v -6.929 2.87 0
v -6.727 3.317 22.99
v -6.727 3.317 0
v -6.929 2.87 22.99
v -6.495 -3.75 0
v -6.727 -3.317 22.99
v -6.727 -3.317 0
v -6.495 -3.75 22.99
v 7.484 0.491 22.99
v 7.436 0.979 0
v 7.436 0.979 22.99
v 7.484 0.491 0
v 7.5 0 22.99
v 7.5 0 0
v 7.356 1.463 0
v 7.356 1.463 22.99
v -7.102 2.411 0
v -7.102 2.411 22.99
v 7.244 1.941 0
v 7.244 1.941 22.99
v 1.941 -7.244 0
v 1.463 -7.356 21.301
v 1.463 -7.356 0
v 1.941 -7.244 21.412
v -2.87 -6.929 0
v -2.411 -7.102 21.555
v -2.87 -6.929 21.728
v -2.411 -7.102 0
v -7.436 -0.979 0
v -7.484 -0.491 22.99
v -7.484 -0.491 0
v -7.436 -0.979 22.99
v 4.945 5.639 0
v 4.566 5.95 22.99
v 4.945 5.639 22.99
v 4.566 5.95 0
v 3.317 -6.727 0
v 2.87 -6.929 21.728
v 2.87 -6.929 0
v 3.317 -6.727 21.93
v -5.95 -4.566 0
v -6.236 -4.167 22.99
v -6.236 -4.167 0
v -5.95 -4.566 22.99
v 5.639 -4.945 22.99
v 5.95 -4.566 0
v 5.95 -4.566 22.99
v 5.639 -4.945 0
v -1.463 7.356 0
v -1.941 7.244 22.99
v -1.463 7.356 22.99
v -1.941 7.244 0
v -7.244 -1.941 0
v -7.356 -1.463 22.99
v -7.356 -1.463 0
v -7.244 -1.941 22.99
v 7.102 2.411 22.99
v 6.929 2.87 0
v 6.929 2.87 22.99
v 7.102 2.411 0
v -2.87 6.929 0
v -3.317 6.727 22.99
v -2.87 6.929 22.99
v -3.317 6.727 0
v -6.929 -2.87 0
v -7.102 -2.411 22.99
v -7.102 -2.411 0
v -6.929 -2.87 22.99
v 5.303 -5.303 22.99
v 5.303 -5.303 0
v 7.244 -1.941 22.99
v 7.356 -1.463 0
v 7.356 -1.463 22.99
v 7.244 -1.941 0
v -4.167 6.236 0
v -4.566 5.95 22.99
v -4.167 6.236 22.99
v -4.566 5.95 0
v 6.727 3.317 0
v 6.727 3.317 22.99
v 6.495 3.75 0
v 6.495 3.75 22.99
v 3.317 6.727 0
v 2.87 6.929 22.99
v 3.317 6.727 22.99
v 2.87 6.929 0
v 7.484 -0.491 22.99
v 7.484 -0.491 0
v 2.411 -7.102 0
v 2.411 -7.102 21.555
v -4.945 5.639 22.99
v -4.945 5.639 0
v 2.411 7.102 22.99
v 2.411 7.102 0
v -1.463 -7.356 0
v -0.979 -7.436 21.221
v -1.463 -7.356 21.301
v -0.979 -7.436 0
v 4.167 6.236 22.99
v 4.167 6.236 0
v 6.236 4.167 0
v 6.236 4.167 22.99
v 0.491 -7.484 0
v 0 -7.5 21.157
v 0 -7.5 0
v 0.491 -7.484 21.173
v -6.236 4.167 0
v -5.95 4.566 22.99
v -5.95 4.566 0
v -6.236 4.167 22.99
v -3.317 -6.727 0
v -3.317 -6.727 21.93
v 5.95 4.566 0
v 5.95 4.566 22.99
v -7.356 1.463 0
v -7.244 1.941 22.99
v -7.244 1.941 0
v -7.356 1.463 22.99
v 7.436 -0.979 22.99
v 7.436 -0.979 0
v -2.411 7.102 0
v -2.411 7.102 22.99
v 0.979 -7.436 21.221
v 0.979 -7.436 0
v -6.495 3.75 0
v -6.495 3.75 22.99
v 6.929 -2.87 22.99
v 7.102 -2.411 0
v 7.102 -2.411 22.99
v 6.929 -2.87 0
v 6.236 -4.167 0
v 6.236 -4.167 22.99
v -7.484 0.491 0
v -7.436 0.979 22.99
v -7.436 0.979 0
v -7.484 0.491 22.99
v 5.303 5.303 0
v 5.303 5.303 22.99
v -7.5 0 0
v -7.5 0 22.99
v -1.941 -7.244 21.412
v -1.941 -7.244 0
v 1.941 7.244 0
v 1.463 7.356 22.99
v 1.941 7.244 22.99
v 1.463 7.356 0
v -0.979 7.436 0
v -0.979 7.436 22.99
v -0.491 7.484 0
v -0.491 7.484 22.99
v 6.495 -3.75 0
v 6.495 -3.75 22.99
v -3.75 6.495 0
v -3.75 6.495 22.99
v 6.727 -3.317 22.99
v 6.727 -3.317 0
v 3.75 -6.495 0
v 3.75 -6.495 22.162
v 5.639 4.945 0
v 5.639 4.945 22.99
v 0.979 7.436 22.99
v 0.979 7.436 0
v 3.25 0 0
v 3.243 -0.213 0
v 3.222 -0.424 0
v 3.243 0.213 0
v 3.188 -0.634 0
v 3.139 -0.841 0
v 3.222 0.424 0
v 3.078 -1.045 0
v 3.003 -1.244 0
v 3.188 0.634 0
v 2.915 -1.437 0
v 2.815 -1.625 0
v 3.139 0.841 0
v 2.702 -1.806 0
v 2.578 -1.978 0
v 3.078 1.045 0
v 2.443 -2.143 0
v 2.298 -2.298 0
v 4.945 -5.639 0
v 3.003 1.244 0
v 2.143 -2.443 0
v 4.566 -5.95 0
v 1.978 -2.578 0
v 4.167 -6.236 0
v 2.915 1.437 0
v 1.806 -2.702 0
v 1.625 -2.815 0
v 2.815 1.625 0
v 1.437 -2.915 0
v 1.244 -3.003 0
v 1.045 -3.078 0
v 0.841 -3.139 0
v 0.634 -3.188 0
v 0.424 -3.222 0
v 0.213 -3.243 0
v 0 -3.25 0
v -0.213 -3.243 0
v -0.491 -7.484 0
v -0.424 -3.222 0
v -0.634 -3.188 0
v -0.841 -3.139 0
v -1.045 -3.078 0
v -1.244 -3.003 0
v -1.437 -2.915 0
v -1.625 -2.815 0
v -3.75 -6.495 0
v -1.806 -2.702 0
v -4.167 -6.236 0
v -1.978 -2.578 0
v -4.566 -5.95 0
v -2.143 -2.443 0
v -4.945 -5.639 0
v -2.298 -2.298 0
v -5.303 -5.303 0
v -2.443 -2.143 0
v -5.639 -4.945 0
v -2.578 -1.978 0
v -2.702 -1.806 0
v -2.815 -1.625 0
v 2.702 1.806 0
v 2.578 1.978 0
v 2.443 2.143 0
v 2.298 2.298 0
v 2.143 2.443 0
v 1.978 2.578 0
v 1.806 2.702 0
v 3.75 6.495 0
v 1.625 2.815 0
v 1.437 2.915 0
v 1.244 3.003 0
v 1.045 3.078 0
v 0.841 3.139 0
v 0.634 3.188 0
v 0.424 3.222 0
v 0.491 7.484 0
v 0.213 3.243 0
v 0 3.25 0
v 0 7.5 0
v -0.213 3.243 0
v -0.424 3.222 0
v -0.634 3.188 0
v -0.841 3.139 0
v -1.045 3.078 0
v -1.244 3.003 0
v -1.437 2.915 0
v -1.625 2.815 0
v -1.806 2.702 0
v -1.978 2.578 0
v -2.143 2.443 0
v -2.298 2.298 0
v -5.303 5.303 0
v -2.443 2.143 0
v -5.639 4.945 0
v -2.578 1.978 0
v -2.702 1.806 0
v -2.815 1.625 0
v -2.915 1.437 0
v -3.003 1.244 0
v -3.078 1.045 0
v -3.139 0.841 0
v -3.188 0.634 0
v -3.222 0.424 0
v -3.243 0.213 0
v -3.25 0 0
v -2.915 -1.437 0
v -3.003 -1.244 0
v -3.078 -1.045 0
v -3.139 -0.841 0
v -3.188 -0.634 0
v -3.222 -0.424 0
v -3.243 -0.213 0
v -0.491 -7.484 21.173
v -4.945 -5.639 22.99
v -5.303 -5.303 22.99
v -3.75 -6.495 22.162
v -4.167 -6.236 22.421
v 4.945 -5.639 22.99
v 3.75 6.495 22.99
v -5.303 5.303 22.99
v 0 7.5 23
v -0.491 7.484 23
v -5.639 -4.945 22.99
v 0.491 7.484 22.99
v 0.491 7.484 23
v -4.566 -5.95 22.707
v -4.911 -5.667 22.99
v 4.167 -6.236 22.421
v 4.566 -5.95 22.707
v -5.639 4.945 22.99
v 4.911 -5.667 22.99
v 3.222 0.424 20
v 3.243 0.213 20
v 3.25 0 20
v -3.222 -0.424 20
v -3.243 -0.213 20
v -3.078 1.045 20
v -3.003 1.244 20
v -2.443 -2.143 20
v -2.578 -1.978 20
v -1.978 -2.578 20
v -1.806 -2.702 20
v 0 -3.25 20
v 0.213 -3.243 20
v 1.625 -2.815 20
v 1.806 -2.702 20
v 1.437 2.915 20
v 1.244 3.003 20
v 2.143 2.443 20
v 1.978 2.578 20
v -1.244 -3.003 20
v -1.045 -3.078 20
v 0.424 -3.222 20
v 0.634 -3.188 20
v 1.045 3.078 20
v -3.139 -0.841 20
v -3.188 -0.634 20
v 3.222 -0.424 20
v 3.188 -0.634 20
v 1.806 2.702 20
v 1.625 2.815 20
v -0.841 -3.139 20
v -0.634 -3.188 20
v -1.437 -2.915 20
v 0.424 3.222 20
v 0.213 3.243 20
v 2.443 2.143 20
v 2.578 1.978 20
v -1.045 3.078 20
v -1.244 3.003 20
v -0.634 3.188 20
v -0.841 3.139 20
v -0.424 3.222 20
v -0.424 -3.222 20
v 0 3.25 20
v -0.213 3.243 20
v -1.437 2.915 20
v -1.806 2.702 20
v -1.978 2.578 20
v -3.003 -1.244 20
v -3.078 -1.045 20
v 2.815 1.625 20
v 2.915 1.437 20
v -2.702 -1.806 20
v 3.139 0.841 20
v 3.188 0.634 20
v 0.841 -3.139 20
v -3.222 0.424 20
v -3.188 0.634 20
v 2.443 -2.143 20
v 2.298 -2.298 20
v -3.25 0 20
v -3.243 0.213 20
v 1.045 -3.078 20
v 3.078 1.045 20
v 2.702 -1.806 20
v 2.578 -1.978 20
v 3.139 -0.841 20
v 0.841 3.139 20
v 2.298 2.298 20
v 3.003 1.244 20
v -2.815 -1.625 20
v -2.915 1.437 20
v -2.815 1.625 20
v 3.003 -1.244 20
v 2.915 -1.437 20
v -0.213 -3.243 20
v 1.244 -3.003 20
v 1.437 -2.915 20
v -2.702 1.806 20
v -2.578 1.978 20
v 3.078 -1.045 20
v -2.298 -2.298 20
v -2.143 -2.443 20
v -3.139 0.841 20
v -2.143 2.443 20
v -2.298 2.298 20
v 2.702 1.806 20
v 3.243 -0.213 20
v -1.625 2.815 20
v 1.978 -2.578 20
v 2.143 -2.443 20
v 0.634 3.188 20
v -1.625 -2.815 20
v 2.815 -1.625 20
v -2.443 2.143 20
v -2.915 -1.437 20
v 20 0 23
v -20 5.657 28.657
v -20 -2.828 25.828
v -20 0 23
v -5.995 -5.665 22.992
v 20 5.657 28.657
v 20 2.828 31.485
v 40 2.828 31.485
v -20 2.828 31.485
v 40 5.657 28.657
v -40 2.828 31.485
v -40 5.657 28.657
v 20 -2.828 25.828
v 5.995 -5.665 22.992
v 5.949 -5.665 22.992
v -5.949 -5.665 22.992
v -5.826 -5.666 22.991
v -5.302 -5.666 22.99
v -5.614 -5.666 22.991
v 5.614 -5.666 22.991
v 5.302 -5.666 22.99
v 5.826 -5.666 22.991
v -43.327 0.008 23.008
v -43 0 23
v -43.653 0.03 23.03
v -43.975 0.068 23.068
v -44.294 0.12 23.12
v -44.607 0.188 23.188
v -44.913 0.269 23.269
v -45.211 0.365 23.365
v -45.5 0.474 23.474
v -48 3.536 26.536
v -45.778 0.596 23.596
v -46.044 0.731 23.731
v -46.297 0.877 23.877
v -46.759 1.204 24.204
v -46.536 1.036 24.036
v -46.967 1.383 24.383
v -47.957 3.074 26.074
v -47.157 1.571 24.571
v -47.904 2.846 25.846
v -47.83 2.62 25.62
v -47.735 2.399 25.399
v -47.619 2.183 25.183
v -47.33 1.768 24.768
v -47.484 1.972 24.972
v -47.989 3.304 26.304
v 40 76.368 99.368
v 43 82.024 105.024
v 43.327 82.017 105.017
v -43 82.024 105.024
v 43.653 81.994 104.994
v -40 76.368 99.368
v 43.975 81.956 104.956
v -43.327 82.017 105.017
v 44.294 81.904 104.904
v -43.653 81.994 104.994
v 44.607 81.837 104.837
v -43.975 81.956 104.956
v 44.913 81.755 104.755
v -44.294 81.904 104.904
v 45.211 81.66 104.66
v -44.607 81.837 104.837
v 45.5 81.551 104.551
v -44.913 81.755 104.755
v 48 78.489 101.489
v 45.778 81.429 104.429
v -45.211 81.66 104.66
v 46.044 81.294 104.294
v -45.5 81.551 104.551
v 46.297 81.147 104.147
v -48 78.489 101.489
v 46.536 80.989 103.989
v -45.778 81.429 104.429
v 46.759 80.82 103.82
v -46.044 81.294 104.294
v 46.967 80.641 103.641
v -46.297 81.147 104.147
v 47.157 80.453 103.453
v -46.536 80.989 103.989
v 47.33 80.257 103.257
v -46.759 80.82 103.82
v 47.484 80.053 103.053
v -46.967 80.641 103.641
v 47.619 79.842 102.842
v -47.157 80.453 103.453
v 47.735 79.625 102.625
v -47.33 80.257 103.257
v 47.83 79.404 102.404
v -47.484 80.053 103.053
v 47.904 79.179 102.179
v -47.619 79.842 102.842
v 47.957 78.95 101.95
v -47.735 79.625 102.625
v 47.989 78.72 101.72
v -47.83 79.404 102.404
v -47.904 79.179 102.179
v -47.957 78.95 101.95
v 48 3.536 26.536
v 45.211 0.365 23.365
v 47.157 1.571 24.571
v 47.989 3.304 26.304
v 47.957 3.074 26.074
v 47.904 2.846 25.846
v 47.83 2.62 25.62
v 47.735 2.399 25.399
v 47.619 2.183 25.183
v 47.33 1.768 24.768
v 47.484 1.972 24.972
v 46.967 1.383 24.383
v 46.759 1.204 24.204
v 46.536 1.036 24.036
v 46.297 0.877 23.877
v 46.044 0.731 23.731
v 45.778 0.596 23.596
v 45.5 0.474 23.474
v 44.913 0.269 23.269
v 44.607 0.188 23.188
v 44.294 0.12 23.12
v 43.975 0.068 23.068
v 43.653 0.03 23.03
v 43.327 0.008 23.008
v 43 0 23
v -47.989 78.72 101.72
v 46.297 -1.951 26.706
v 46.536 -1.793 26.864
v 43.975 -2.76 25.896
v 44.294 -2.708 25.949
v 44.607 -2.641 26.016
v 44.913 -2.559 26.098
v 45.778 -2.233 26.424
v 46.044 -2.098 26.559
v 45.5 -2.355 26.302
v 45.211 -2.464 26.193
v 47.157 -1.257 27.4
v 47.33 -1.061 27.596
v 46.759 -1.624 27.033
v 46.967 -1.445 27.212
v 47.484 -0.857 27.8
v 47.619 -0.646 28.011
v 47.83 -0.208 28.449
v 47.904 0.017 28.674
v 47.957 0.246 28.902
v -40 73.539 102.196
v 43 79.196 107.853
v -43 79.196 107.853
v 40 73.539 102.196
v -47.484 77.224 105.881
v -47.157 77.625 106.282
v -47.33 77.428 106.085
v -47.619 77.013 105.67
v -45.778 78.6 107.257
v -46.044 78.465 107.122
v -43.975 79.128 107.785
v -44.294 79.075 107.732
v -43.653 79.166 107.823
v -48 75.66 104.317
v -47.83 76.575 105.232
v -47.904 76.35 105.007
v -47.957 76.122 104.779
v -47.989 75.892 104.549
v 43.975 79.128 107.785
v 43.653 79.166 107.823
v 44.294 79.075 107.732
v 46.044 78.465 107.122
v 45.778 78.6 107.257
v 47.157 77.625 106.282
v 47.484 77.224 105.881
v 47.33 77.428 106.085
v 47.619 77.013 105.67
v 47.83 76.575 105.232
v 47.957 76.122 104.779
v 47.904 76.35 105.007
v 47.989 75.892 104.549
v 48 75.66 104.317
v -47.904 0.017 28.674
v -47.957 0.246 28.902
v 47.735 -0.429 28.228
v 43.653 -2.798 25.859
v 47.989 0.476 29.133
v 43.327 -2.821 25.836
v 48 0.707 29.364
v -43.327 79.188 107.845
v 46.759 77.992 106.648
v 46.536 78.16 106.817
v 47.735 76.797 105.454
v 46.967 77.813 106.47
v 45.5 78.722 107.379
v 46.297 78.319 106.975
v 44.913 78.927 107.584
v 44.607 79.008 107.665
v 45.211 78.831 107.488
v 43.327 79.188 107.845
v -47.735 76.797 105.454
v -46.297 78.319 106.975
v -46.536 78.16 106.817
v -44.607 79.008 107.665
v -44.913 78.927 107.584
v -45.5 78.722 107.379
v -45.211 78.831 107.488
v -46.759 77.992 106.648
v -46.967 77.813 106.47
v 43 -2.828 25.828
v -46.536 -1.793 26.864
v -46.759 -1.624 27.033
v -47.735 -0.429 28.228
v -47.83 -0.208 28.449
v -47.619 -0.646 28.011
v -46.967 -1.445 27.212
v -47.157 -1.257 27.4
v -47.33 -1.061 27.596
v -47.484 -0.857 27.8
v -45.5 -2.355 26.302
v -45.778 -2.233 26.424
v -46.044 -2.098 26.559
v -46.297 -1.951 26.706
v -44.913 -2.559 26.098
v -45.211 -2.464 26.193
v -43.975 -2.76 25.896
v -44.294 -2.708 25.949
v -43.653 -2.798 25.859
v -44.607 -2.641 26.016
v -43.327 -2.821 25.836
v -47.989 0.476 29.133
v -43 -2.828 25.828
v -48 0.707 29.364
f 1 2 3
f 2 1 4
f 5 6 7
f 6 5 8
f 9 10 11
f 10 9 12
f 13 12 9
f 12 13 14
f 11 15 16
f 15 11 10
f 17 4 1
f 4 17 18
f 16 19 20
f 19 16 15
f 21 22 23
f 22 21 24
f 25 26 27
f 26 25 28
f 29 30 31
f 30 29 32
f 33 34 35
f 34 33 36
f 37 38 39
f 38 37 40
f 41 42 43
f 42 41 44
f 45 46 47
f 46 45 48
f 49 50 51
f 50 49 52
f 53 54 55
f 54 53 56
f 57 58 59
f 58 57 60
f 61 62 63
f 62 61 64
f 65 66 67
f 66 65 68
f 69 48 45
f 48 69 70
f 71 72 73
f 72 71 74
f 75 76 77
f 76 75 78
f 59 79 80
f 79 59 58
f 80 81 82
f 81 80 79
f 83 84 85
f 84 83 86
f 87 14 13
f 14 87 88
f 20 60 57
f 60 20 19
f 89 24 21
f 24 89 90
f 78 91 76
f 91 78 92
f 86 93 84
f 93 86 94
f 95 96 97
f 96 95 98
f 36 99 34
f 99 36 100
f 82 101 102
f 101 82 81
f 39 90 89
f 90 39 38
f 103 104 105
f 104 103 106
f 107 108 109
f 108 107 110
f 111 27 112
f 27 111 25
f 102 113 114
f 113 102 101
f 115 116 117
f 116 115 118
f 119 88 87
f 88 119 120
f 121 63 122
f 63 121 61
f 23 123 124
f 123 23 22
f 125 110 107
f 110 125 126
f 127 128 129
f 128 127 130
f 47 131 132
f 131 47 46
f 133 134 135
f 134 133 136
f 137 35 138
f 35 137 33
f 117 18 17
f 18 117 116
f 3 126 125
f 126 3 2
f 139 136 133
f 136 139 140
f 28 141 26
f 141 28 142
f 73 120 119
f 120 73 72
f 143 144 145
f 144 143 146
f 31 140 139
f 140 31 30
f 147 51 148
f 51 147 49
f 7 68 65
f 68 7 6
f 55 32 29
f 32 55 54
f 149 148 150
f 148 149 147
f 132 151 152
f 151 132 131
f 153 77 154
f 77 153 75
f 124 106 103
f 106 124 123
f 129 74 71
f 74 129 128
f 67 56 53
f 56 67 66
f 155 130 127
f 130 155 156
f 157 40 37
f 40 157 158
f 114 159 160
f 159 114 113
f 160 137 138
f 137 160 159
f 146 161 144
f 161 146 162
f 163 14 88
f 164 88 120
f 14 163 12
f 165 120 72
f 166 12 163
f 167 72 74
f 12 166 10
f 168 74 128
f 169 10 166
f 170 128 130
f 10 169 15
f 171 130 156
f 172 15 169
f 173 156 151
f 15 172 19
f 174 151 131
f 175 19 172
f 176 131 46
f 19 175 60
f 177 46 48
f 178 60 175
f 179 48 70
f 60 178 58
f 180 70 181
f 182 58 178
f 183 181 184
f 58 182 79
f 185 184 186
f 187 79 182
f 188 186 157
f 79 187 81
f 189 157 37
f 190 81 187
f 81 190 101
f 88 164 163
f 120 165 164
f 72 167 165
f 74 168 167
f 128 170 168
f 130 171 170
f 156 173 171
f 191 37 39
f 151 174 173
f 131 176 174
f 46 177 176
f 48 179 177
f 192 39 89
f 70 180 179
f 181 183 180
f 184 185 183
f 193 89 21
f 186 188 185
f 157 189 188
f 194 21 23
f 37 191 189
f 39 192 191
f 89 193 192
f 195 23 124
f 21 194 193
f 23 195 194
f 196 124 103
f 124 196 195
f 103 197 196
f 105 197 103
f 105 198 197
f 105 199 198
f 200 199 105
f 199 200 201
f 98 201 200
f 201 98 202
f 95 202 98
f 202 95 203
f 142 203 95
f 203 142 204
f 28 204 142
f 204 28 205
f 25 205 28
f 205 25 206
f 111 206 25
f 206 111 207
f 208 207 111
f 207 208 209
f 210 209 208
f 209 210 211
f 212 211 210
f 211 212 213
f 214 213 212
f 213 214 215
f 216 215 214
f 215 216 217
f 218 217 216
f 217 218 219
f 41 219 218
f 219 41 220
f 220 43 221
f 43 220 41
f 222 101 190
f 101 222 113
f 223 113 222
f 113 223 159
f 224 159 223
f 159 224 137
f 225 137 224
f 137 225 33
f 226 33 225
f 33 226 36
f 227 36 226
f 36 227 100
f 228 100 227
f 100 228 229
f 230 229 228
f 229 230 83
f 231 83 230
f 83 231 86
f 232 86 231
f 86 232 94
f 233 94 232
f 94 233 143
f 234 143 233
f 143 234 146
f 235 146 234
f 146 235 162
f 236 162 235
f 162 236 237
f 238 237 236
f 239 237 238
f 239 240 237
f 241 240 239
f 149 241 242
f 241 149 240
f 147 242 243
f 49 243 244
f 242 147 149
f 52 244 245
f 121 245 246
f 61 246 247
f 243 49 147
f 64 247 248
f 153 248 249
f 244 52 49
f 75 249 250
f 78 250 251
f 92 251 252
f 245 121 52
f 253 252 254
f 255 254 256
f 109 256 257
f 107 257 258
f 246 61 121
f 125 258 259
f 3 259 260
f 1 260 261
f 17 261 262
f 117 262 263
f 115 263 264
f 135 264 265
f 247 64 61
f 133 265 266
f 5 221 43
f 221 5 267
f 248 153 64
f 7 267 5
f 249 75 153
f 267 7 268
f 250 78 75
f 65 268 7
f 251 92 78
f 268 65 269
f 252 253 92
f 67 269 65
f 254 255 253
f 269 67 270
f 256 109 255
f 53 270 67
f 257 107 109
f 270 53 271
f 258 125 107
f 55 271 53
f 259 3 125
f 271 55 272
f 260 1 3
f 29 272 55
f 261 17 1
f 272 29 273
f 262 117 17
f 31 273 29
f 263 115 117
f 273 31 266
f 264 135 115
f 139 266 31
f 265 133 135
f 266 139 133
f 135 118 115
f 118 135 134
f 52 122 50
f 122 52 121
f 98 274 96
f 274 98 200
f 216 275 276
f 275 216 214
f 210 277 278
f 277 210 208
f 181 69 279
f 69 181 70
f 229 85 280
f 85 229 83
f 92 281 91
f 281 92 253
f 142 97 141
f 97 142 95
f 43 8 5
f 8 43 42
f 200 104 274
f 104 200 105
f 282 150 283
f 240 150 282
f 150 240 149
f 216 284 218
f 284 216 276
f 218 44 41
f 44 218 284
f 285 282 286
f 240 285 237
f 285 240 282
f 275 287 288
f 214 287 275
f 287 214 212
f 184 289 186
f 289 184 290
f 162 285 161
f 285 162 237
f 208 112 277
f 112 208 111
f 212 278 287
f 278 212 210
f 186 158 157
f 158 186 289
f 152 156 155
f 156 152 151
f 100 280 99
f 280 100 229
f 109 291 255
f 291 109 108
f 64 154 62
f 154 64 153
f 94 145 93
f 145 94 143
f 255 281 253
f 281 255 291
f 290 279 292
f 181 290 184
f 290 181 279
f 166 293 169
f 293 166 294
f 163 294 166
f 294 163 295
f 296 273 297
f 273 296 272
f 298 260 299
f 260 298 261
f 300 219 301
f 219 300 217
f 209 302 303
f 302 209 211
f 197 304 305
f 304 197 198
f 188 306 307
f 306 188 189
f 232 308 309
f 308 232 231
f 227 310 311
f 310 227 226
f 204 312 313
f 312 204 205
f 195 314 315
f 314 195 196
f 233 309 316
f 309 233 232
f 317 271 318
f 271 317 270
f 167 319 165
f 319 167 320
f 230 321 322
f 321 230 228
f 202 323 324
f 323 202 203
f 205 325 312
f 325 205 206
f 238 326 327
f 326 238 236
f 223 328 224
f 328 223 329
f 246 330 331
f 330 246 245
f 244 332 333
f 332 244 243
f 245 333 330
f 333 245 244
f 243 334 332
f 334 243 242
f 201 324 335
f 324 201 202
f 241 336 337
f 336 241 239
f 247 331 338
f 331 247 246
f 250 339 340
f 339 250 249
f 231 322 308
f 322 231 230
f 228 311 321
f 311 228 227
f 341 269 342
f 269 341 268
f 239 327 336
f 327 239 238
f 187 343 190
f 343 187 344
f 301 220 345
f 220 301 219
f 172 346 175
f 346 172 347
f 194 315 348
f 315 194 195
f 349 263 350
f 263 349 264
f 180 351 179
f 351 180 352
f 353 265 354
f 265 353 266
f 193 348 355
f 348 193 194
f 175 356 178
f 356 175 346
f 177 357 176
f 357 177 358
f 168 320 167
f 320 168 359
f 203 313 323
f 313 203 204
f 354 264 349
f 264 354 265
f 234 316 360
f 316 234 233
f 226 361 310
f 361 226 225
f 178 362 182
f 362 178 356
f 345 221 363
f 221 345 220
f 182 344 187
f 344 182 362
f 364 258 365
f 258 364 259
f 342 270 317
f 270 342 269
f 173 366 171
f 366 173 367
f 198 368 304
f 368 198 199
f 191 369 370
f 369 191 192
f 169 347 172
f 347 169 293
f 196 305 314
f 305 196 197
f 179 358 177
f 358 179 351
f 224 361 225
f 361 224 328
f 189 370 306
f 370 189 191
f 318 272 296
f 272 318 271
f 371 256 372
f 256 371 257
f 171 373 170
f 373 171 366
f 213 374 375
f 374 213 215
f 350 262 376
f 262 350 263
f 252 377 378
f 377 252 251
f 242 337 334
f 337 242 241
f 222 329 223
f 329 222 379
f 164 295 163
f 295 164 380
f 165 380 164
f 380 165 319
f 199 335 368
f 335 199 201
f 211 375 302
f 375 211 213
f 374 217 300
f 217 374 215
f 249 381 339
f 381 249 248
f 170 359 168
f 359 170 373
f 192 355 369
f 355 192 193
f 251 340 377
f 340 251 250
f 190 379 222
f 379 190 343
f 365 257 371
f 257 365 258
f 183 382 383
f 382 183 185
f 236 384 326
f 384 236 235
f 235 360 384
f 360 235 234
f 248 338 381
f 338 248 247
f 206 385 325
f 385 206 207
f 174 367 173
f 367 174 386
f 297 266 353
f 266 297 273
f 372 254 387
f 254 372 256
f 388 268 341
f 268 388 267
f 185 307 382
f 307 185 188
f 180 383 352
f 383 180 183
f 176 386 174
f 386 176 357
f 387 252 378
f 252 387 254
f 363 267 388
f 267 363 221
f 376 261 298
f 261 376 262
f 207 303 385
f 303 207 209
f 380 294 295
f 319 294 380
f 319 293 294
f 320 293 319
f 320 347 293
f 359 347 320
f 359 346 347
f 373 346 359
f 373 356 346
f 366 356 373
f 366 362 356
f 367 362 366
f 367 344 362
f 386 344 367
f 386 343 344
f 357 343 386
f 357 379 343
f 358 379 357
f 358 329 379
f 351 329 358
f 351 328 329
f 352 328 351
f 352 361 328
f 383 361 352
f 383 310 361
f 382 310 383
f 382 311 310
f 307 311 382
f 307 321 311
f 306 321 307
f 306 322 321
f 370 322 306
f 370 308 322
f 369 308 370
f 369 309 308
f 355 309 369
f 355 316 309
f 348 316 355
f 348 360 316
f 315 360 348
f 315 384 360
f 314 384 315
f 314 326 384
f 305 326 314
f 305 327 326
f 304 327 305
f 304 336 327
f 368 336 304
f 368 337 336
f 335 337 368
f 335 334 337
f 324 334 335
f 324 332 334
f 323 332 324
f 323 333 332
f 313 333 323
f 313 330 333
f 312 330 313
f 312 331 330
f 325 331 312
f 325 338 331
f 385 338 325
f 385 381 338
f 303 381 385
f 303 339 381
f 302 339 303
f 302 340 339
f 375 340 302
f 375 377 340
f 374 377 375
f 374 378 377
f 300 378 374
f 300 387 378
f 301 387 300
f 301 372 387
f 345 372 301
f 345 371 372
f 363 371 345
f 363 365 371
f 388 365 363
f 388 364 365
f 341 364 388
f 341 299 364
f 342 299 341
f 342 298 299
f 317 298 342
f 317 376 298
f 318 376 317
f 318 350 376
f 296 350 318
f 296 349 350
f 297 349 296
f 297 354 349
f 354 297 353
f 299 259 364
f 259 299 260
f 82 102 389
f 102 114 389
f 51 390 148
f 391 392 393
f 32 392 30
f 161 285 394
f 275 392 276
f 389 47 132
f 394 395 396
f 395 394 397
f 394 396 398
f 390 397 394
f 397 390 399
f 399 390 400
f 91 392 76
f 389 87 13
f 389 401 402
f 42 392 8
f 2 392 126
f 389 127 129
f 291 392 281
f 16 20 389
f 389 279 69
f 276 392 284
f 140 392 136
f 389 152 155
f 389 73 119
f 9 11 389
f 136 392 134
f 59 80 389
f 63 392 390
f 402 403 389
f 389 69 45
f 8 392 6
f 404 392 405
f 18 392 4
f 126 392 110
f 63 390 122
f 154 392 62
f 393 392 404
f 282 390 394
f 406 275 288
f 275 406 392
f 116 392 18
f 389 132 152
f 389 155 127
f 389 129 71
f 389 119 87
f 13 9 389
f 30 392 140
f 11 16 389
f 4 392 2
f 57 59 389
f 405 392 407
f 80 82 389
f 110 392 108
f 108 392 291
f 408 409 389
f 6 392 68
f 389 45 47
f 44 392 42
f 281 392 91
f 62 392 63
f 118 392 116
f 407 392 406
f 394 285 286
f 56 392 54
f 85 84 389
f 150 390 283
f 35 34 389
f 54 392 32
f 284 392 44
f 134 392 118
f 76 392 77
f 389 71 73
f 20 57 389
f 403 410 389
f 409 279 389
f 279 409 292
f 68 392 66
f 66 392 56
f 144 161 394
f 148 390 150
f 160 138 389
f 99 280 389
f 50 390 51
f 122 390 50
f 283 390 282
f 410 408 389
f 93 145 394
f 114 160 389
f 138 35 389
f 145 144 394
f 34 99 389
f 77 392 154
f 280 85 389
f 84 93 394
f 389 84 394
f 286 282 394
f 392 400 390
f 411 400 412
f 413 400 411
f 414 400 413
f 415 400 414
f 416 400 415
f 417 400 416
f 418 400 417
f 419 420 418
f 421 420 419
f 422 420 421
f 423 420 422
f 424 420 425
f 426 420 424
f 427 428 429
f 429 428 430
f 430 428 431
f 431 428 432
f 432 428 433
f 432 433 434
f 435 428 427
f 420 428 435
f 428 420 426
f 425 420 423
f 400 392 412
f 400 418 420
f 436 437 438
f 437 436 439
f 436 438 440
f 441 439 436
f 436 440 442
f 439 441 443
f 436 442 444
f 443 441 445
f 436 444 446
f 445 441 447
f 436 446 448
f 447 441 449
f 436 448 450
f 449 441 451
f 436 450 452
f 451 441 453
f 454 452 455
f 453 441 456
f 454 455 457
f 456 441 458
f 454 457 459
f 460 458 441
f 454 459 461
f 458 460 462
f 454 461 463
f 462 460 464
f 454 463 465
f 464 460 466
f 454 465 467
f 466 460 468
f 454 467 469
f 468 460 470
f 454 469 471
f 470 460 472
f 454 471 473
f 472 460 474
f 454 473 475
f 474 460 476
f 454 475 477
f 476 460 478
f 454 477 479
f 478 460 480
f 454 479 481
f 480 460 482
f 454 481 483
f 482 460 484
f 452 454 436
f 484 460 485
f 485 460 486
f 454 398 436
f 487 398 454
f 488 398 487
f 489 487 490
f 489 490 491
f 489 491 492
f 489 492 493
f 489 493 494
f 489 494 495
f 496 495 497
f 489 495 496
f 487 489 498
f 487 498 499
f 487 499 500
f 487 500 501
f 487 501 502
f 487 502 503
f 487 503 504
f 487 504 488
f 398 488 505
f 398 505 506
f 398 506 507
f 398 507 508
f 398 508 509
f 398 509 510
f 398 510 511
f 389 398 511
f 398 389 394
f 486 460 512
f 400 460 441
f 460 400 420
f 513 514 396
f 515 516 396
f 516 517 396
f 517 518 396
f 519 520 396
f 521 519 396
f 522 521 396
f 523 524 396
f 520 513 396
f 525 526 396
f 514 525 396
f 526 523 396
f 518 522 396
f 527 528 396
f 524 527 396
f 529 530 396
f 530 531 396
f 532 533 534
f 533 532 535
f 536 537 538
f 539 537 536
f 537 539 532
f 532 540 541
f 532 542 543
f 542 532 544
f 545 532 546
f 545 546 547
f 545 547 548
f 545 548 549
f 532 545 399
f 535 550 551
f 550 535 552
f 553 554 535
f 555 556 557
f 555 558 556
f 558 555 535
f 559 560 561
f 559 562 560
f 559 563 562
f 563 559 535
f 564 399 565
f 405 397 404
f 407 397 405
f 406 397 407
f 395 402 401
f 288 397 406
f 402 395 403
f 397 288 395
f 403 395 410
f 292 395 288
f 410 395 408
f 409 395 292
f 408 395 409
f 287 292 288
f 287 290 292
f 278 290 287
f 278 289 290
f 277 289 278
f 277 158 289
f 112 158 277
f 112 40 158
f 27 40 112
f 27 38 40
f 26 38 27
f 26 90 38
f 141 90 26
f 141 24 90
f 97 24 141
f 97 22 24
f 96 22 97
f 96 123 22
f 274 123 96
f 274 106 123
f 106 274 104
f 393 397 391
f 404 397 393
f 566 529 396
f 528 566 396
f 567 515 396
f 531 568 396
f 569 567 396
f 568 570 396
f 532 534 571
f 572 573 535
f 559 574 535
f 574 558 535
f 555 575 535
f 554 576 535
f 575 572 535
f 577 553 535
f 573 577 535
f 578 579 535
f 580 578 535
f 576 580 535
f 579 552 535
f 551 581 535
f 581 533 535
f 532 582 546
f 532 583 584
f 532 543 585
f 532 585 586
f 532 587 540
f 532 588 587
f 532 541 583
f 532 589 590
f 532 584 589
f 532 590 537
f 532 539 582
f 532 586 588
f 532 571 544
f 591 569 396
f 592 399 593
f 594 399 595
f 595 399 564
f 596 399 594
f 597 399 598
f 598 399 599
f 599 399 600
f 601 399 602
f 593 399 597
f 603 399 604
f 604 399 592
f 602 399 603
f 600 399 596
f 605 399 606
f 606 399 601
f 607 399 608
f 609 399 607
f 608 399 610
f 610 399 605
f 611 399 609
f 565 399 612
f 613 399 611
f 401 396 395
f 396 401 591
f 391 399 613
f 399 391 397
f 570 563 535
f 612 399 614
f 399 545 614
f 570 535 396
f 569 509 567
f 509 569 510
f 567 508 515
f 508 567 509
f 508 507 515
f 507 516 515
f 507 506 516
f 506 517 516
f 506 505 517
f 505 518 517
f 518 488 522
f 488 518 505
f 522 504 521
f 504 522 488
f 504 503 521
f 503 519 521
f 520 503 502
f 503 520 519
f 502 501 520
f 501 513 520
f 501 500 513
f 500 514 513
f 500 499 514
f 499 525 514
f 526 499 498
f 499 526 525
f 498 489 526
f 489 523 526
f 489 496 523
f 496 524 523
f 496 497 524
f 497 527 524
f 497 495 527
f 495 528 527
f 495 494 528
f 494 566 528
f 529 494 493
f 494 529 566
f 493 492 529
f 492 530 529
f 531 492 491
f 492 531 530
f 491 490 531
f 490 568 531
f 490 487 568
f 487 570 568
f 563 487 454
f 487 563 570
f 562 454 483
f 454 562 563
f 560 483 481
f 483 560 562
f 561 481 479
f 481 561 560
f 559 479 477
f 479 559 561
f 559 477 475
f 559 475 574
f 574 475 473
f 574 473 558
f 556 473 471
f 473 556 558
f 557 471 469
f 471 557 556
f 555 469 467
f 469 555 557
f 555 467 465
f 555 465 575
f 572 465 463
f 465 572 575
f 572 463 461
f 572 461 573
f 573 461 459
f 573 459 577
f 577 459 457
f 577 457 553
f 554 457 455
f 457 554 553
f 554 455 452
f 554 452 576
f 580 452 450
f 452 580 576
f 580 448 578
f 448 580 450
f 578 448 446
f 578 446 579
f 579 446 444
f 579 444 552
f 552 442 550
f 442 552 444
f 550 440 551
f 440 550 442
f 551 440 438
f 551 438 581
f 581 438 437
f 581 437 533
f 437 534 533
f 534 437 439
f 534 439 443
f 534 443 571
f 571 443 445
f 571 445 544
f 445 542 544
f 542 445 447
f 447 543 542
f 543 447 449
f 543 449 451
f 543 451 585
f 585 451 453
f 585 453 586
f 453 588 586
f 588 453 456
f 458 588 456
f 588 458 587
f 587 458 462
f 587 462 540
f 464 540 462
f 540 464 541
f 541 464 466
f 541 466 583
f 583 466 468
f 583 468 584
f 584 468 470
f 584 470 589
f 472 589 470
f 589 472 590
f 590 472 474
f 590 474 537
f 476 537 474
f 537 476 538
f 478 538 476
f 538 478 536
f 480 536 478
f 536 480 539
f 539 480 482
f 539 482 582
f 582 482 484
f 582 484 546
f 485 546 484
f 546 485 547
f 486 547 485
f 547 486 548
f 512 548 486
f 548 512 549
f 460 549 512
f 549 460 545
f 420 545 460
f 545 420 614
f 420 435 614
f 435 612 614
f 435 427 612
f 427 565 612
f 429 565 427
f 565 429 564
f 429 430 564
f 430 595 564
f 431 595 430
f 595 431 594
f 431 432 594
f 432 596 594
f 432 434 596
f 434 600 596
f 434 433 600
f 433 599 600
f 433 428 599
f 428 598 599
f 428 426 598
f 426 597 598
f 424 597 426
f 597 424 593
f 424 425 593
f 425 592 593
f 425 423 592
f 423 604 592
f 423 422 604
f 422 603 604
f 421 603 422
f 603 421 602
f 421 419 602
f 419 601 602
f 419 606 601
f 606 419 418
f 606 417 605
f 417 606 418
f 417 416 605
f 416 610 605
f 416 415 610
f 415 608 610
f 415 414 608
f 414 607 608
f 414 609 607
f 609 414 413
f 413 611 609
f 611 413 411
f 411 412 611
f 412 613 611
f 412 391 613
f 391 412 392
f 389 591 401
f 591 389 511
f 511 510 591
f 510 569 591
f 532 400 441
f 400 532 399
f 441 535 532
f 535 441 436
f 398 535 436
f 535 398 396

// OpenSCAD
// ===================================================================
// Angled Viewing Window
//
// A picture-frame border (outer rounded rectangle with a rectangular
// hole through the middle, like a real picture frame) mounted above a
// socket cylinder that is bored to take a 7 mm wooden dowel. The
// matching stand that holds the other end of the dowel is a separate
// part -- see dowel-stand.scad.
//
// The socket stays upright -- parallel to the Z axis, same as the
// dowel -- while only the frame tilts, hinged up and back off the
// socket's front rim by tilt_angle, so it leans over the socket
// without any part of it reaching down into the middle of the viewing
// opening. A tapered gusset (a smooth hull blend, like the root flare
// on a wine glass stem) fills the concave gap between the round
// socket and the flat underside of the frame, so the two parts are
// backed by a continuous wedge of solid material instead of meeting
// at a thin edge.
//
// Axes: X/Y = footprint on the table, Z = up.
// ===================================================================

/* [Dowel (mm)] */
dowel_diameter   = 6.5;     // actual diameter of the wooden dowel; must match dowel-stand.scad and mirror-spinner-stand.scad
hole_clearance   = 0;   // added to dowel_diameter for a snug press/slide fit; must match dowel-stand.scad and mirror-spinner-stand.scad
dowel_hole_depth = 20;    // how deep the dowel is expected to sit in the hole; must match dowel-stand.scad and mirror-spinner-stand.scad -- it's the one shared parameter that drives dowel-stand.scad's leg-equalizing math (socket_length below is defined from it), so change it there if you change it here

/* [Window picture-frame opening (mm)] */
opening_width  = 80;  // inner opening you look through, X (the "picture frame hole")
opening_depth  = 100;   // inner opening you look through, Y

/* [Window picture-frame border (mm)] */
frame_border    = 8;   // border width added on all sides (outer = opening + 2 * frame_border)
frame_thickness = 4;   // how thick the frame material is (depth into the page)
frame_corner_r  = 5;  // corner rounding radius of the OUTER edge of the frame

/* [Window socket cylinder] */
post_diameter   = 15;   // must match post_diameter in dowel-stand.scad
socket_diameter = post_diameter;  // cylinder attached to the bottom border, holds the dowel
socket_length   = dowel_hole_depth+3;  // length of the socket cylinder, continuing the frame's plane

/* [Window support gusset] */
gusset_width = 40;  // width of the reinforcing brace between socket and frame, along X (mm)
gusset_reach = 8;   // how far the brace extends into the frame border, from the pivot (mm)

/* [Window tilt] */
tilt_angle = 45;  // angle the whole frame+socket assembly leans forward, degrees

/* [Rendering] */
$fn = 96;

// ===== Derived values =====
dowel_hole_d = dowel_diameter + hole_clearance;
frame_width  = opening_width + 2 * frame_border;   // outer frame footprint, X
frame_depth  = opening_depth + 2 * frame_border;   // outer frame footprint, Y

// ===== Checks =====
assert(2 * frame_corner_r <= min(frame_width, frame_depth),
    "frame_corner_r is too large for the frame footprint");
assert(socket_diameter > dowel_hole_d,
    "socket_diameter must be larger than the dowel hole diameter");
assert(socket_length > dowel_hole_depth,
    "socket_length should be greater than dowel_hole_depth so the hole doesn't pass all the way through");
assert(gusset_width > 0 && gusset_width <= frame_width,
    "gusset_width must be positive and no wider than the frame");
assert(gusset_reach > 0 && gusset_reach <= opening_depth,
    "gusset_reach must be positive and small enough to stay within the window");
assert(tilt_angle > 0 && tilt_angle < 90,
    "tilt_angle must be between 0 and 90 degrees");

// ===== 2D helpers =====

// Rounded rectangle centered on the origin, width w (X) x depth d (Y).
module rounded_rect_2d(w, d, r) {
    hull() {
        for (sx = [-1, 1], sy = [-1, 1])
            translate([sx * (w / 2 - r), sy * (d / 2 - r)])
                circle(r = r);
    }
}

// ===== Window =====
//
// The socket is a plain upright cylinder, axis parallel to Z, base at
// the origin — same orientation as the dowel it receives.
//
// The frame is built flat in the X/Y plane (as if lying face-up on
// the table, centered on the origin) and then hinged upward: rotated
// about a pivot line that runs through the socket's center, at the
// socket's top. Because the pivot line sits at the same height as the
// socket's top face, the frame's bottom border rests flush on top of
// the socket (solid contact, welded by the union) and then leans back
// as it tilts, opening up above the socket without any part of the
// frame or its border reaching back down over the dowel hole.
//
// A gusset — the hull() between the socket's top disc and a patch in
// that same tilted plane, matching the border's own footprint at the
// pivot — fills in the concave wedge between the round socket and the
// flat frame underside with a smooth, continuously tapered brace, so
// the joint carries load over a wide blended area rather than the
// thin edge where the two would otherwise just touch.
//
// Because the socket stays vertical while only the frame tilts, the
// socket's own rim (and the gusset built from it) pokes slightly past
// the plane of the frame's outward face — the face most people would
// want flat on the print bed. front_face_trim() shaves off exactly
// that sliver so the outward face is the true extremal plane of the
// part and can sit flush, with no visible impact anywhere else.

// Picture-frame border: outer rounded rectangle with a plain
// rectangular hole through the middle, extruded to frame_thickness.
module frame_border_shape() {
    linear_extrude(height = frame_thickness)
        difference() {
            rounded_rect_2d(frame_width, frame_depth, frame_corner_r);
            square([opening_width, opening_depth], center = true);
        }
}

// Upright socket cylinder, bored for the dowel, base at the origin.
module socket_shape() {
    difference() {
        cylinder(d = socket_diameter, h = socket_length);
        translate([0, 0, -1])
            cylinder(d = dowel_hole_d, h = dowel_hole_depth + 1);
    }
}

// Structural gusset: the hull between a flat disc at the socket's top
// and a block that matches the frame border's own footprint at the
// pivot (same width-limited-to-gusset_width, same reach as the border
// is deep there). Both cross-sections live in the frame's tilted
// plane, so the hull sweeps smoothly from round socket to flat
// border — a strong, continuously tapered fillet instead of a knife
// edge.
module gusset_shape() {
    hull() {
        translate([0, 0, socket_length - 0.01])
            cylinder(d = socket_diameter, h = 0.01);

        translate([0, 0, socket_length])
            rotate([tilt_angle, 0, 0])
                translate([-gusset_width / 2, 0, 0])
                    cube([gusset_width, gusset_reach, frame_thickness]);
    }
}

// Half-space cutter coincident with the frame's outward face (local
// z = frame_thickness in frame_border_shape's own coordinates),
// carried through the exact same translate/rotate/translate chain
// used to place the frame. Subtracting this trims away any material
// (socket rim, gusset) that would otherwise poke past that plane,
// without touching the frame itself, which never extends beyond it.
module front_face_trim() {
    big = 1000;
    translate([0, 0, socket_length])
        rotate([tilt_angle, 0, 0])
            translate([0, frame_depth / 2, 0])
                translate([-big / 2, -big / 2, frame_thickness])
                    cube([big, big, big]);
}

module window() {
    difference() {
        union() {
            socket_shape();
            gusset_shape();

            // hinge the frame up from the socket's top, pivoting through
            // its center so the bottom border sits flush on the socket
            // face before leaning back
            translate([0, 0, socket_length])
                rotate([tilt_angle, 0, 0])
                    translate([0, frame_depth / 2, 0])
                        frame_border_shape();
        }

        front_face_trim();
    }
}

echo(str("Dowel hole diameter: ", dowel_hole_d, " mm (dowel ", dowel_diameter,
         " mm + ", hole_clearance, " mm clearance)"));
echo(str("Window: outer frame ", frame_width, " x ", frame_depth, " x ", frame_thickness,
         " mm, opening ", opening_width, " x ", opening_depth,
         " mm, border ", frame_border,
         " mm, socket d=", socket_diameter, " x l=", socket_length,
         " mm, gusset w=", gusset_width, " x reach=", gusset_reach,
         " mm, tilt ", tilt_angle, " deg"));

window();
